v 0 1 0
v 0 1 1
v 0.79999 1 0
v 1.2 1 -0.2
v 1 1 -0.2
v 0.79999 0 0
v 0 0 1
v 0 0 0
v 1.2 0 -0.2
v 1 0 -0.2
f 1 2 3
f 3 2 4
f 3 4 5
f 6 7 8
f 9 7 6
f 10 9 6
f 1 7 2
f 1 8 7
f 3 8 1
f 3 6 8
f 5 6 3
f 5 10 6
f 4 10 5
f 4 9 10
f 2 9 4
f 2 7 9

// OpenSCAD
translate([0,1,0])
rotate([90,0,0])
linear_extrude(1.0) {
    polygon([[0,0], [0,1], [1.2,-.2], [1, -.2], [.8, 0]]);
};
